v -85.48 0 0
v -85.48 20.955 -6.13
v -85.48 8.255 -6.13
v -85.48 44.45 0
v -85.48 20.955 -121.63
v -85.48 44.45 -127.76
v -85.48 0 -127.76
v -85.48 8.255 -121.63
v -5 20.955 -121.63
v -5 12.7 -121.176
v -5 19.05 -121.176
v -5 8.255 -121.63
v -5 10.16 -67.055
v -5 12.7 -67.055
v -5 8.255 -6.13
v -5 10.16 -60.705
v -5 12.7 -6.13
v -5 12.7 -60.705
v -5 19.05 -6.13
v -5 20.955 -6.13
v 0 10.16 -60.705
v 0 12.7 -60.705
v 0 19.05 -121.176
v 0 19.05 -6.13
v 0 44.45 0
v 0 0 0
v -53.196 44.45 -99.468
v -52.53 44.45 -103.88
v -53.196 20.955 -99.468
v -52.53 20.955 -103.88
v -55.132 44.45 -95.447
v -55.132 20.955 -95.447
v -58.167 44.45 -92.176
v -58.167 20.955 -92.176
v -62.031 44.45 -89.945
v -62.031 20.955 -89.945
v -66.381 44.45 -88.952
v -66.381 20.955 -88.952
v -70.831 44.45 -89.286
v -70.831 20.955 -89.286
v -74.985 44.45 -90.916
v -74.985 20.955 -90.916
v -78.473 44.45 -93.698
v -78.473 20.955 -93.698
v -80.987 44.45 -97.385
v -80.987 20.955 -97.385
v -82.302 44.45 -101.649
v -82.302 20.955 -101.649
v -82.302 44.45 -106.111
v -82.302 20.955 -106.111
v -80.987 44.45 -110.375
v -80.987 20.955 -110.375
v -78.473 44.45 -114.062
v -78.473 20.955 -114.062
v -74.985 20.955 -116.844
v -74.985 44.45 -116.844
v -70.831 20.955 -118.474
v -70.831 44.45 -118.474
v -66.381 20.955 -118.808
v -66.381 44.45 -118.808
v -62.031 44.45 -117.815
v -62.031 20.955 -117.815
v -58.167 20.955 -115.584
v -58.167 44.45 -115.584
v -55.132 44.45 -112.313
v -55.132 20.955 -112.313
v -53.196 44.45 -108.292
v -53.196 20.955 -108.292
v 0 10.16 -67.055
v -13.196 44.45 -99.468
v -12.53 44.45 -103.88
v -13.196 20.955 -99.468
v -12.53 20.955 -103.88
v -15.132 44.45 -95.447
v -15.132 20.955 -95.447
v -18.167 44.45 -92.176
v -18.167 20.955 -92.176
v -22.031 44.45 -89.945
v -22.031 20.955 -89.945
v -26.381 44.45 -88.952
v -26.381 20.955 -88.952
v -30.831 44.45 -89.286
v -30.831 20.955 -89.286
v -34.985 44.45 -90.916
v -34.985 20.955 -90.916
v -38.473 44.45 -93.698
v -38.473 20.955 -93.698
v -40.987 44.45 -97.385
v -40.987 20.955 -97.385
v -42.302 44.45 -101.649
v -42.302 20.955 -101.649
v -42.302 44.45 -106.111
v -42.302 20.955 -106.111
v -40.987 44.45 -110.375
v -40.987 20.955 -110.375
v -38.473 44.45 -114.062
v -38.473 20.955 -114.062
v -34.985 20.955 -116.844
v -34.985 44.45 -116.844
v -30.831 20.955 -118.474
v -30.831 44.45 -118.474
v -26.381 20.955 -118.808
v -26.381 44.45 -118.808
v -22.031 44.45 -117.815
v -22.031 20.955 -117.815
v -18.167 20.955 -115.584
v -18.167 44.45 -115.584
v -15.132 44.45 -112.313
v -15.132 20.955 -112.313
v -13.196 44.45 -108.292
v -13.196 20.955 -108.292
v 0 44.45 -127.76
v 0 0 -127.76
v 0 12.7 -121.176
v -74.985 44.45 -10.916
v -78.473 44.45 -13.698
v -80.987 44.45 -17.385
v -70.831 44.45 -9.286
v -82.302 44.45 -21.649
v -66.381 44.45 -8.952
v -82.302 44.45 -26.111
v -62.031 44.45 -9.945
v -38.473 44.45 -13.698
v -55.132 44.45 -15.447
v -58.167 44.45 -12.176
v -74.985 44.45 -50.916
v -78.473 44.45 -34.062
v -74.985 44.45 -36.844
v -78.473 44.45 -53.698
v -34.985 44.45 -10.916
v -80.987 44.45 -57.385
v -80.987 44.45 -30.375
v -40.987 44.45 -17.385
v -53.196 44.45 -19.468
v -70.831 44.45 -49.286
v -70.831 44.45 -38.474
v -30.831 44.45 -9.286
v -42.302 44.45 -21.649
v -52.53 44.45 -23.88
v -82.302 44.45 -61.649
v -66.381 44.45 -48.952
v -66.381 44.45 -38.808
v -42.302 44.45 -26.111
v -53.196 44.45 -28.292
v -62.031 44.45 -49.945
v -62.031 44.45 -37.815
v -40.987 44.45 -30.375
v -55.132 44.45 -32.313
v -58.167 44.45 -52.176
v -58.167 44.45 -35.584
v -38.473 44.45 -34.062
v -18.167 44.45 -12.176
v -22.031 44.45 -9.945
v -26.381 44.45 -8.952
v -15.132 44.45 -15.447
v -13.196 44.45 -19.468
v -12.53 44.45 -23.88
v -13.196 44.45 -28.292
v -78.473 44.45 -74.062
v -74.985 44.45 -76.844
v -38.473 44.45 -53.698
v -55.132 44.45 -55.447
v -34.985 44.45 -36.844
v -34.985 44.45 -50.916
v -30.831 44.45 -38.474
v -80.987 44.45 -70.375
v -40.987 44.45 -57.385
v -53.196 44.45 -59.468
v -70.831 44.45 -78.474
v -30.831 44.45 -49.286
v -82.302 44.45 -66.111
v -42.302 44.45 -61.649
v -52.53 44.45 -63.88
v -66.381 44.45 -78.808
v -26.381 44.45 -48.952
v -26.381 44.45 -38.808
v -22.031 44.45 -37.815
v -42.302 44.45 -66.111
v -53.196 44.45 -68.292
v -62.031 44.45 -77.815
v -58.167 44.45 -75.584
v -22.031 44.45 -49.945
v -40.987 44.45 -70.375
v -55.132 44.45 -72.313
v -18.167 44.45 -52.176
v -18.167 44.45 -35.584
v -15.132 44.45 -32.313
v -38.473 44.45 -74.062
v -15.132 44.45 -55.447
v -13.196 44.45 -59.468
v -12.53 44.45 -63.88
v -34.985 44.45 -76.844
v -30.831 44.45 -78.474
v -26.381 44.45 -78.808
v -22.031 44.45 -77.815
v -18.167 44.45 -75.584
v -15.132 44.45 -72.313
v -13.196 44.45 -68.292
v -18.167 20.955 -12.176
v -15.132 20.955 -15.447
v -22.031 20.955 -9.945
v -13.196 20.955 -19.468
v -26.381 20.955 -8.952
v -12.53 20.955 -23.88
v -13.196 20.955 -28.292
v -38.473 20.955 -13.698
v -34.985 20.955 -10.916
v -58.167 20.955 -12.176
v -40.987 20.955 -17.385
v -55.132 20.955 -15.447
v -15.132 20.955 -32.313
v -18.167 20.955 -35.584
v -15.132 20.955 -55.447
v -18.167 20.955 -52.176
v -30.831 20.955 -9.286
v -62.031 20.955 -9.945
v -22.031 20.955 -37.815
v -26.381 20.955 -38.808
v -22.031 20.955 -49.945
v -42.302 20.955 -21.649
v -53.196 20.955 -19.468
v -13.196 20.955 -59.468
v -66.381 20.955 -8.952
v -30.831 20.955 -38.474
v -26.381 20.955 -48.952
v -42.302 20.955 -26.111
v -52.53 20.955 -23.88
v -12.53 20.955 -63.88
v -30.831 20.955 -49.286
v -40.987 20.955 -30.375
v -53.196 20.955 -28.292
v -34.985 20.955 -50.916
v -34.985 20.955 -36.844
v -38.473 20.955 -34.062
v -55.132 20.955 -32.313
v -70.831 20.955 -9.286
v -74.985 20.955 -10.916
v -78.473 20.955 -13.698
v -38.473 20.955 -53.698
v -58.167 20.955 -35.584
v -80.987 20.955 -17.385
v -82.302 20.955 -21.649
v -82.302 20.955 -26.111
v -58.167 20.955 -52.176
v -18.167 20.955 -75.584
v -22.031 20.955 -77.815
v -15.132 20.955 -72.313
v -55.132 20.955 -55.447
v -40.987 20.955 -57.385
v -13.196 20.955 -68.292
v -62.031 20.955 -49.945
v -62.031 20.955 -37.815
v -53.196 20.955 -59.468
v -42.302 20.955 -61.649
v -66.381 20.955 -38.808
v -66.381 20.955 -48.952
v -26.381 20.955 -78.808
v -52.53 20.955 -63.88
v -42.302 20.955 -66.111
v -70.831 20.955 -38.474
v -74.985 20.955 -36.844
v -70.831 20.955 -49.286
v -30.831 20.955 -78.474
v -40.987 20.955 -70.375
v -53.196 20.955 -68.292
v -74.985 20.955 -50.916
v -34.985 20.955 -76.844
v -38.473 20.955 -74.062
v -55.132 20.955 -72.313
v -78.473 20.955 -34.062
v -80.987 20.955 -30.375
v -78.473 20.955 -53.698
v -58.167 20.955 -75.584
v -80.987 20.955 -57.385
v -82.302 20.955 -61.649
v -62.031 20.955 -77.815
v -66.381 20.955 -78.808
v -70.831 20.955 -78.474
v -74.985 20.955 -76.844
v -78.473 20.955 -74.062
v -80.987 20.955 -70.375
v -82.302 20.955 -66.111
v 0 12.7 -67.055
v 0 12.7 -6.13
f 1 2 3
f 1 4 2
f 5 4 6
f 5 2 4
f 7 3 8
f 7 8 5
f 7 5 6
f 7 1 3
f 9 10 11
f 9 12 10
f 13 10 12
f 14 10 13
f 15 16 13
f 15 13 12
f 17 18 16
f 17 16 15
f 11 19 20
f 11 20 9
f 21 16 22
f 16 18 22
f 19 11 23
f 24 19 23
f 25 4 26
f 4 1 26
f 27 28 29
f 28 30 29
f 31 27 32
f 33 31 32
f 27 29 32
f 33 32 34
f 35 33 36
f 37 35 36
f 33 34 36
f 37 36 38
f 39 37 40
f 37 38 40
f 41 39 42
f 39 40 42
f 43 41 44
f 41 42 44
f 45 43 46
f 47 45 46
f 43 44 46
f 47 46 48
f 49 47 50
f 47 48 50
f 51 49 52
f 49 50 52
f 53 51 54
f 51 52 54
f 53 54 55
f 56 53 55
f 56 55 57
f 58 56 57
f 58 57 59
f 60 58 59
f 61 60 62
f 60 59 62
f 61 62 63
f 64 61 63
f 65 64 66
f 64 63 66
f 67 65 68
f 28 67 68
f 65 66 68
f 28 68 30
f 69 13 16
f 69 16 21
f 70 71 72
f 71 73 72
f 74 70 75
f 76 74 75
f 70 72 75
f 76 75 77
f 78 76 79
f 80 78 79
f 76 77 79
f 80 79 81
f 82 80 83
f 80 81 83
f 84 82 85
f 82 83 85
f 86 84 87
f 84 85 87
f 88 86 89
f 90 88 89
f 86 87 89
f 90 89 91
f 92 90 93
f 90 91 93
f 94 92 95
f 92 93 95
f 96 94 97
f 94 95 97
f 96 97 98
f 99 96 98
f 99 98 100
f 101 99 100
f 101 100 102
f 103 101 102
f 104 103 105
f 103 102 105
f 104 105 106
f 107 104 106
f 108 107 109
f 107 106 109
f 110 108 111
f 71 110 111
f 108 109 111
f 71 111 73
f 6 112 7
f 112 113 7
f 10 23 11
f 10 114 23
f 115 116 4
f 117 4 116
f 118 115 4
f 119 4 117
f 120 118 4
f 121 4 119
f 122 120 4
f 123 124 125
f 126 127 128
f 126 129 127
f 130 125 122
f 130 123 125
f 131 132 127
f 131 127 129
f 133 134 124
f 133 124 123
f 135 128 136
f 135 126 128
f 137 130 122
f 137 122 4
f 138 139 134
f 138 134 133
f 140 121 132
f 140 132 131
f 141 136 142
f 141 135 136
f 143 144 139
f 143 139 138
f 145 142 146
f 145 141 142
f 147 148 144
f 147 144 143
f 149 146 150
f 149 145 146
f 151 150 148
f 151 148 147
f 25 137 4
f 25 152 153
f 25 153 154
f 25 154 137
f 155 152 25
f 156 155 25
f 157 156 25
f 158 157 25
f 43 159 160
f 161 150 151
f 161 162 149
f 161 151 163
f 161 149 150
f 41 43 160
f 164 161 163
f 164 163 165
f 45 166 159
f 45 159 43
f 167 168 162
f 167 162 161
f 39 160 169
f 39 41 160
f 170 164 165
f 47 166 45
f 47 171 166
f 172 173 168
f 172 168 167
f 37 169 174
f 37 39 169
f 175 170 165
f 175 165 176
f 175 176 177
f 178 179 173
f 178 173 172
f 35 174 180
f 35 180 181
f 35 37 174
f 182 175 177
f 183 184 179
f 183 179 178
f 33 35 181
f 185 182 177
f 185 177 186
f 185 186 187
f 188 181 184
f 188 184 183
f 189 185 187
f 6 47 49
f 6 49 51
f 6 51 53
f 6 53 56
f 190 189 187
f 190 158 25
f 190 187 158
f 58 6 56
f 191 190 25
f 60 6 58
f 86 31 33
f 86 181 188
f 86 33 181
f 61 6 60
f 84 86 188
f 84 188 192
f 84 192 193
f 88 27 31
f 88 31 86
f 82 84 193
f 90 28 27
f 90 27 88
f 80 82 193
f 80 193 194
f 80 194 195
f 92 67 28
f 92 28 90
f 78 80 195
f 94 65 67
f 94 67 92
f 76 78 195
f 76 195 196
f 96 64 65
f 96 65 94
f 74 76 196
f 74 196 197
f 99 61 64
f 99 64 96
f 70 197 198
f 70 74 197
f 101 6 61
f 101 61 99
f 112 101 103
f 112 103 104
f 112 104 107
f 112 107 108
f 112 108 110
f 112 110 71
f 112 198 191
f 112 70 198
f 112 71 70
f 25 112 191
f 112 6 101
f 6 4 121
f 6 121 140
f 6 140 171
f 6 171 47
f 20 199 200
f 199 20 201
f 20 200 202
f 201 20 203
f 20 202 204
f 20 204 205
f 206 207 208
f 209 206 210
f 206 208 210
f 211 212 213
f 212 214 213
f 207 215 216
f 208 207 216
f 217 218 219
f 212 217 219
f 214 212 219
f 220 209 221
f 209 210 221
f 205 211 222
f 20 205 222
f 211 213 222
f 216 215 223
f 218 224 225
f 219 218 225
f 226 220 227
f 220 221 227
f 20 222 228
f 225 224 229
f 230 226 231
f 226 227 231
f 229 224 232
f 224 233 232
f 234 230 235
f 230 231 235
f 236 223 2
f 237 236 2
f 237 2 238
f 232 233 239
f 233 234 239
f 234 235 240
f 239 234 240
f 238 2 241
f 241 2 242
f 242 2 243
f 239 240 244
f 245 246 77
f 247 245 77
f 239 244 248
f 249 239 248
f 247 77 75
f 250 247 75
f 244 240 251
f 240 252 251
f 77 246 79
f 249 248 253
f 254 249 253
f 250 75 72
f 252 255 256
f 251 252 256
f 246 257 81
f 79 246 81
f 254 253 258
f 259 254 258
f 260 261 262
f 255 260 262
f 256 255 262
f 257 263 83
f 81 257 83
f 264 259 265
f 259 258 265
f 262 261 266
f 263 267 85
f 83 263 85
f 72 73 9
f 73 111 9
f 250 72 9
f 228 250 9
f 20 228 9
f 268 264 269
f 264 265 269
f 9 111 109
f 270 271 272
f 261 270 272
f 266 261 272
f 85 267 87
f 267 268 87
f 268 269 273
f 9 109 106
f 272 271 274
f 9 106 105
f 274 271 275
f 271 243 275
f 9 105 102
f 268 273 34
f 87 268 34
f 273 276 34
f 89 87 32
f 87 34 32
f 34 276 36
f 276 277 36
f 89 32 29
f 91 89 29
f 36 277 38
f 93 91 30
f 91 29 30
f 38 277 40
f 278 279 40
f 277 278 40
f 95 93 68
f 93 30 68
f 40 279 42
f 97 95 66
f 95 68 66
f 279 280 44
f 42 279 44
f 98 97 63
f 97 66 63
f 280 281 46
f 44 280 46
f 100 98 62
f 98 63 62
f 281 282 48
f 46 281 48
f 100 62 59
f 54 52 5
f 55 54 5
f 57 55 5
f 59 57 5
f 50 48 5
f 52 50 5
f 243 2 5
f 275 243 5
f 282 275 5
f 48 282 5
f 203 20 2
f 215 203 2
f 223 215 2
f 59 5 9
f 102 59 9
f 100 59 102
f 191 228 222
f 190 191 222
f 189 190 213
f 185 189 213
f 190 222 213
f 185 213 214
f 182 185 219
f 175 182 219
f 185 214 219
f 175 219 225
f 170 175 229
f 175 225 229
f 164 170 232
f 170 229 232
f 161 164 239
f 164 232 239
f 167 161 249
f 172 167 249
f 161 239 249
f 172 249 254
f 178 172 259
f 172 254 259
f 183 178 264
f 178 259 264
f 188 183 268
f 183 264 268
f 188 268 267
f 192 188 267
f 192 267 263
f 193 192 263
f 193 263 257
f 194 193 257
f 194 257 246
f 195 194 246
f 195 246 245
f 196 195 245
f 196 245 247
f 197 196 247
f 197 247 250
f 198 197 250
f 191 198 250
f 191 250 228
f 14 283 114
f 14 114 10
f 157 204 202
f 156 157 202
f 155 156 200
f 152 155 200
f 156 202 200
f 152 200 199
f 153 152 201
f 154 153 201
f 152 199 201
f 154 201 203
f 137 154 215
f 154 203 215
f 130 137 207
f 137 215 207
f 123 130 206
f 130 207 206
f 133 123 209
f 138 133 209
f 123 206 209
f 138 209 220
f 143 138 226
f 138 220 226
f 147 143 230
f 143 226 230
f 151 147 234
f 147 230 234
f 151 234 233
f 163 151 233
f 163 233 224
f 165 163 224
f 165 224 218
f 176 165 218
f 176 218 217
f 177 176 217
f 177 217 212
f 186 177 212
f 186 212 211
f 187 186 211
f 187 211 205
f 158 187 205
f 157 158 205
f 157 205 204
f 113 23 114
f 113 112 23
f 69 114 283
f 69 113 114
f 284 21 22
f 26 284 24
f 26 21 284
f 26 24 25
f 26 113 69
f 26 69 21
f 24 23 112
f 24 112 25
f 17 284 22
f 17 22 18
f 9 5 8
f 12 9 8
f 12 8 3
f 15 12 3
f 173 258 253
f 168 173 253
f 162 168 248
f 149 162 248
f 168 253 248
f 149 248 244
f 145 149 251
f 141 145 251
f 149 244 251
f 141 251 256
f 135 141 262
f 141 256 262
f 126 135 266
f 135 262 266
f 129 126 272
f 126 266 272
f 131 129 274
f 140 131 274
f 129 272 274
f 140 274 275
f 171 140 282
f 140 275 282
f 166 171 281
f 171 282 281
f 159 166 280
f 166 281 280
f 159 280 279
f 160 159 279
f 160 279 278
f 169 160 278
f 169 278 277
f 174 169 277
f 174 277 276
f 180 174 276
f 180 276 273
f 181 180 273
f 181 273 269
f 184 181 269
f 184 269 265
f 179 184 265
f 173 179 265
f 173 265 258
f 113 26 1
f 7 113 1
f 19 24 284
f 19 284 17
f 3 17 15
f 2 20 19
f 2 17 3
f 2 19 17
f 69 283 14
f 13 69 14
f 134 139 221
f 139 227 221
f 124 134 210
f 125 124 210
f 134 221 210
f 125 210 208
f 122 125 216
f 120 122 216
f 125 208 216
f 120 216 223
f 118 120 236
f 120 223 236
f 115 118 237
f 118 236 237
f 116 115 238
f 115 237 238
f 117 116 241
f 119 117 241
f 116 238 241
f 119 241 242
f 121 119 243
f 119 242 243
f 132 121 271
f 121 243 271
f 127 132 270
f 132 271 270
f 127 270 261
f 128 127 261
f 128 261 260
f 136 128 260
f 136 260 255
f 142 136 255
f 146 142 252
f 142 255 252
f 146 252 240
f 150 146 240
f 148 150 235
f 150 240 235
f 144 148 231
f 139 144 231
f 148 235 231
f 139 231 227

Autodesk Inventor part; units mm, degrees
ref_plane "YZ Plane" through (0, 0, 0) normal (1, 0, 0) x (0, 1, 0)
ref_plane "XZ Plane" through (0, 0, 0) normal (0, 1, 0) x (-1, 0, 0)
ref_plane "XY Plane" through (0, 0, 0) normal (0, 0, 1) x (1, 0, 0)
sketch "Sketch1" plane through (0, 0, 0) normal (0, 1, 0) x (-1, 0, 0)
  line L0 (0, 0) -> (85.48, 0)
  line L1 (85.48, 0) -> (85.48, -127.76)
  line L2 (85.48, -127.76) -> (0, -127.76)
  line L3 (0, -127.76) -> (0, 0)
  line L4 (0, 0) -> (7.0711, -7.0711)
  line L5 (0, 0) -> (10, 0) construction
  circle A0 centre (7.0711, -7.0711) radius 4.7625
  dimension "d0" = 85.48
  dimension "d1" = 127.76
  dimension "offsetDiag" = 10
  dimension "d3" = 45
  dimension "d4" = 9.525
extrude "Extrusion1" add sketch "Sketch1" along normal blind 12.7 contours L0 L1 L2 L3 | A0
sketch "Sketch3" plane through (0, 12.7, 0) normal (0, 1, 0) x (1, 0, 0)
  line L0 (0, 0) -> (0, 127.76) projected
  line L1 (0, 63.88) -> (-72.5, 63.88)
  line L2 (-140, 121.63) -> (-5, 121.63)
  line L3 (-5, 121.63) -> (-5, 6.13)
  line L4 (-5, 6.13) -> (-140, 6.13)
  line L5 (-140, 6.13) -> (-140, 121.63)
  line L6 (-140, 121.63) -> (-5, 6.13) construction
  line L7 (-5, 121.63) -> (-140, 6.13) construction
  dimension "d23" = 72.5
  dimension "d24" = 135
  dimension "d25" = 115.5
extrude "Extrusion2" cut sketch "Sketch3" against normal blind 2.54
sketch "Sketch4" plane through (0, 12.7, 0) normal (0, 1, 0) x (1, 0, 0)
  line L0 (-5, 121.63) -> (-5, 6.13) projected
  line L1 (5, 67.055) -> (-5, 67.055)
  line L2 (-5, 67.055) -> (-5, 60.705)
  line L3 (-5, 60.705) -> (5, 60.705)
  line L4 (5, 60.705) -> (5, 67.055)
  line L5 (0, 0) -> (0, 127.76) projected
  line L6 (5, 67.055) -> (-5, 60.705) construction
  line L7 (-5, 67.055) -> (5, 60.705) construction
  point P0 (0, 63.88)
  point P1 (0, 60.705)
  point P2 (0, 67.055)
  dimension "d28" = 6.35
extrude "Extrusion3" cut sketch "Sketch4" against normal blind 2.54 contours L1 L5 L3 L0
sketch "Sketch5" plane through (0, 12.7, 0) normal (0, 1, 0) x (1, 0, 0)
  line L0 (0, 67.055) -> (0, 60.705) projected
  line L1 (0, 63.88) -> (-67.5, 63.88)
  circle A0 centre (-67.5, 63.88) radius 13.335
  line L2 (-85.48, 0) -> (0, 0) projected
  line L3 (-70.04, 127.76) -> (-38.29, 127.76)
  line L4 (-38.29, 127.76) -> (-38.29, 0)
  line L5 (-38.29, 0) -> (-70.04, 0)
  line L6 (-70.04, 0) -> (-70.04, 127.76)
  line L7 (-70.04, 127.76) -> (-38.29, 0) construction
  line L8 (-38.29, 127.76) -> (-70.04, 0) construction
  line L9 (-85.48, 121.63) -> (-5, 121.63) projected
  line L10 (-68.5166, 121.63) -> (-38.29, 121.63)
  line L11 (-38.29, 121.63) -> (-38.29, 127.76)
  line L12 (-38.29, 127.76) -> (-68.5166, 127.76)
  line L13 (-68.5166, 127.76) -> (-68.5166, 121.63)
  line L14 (-5, 6.13) -> (-85.48, 6.13) projected
  line L15 (-70.04, 0) -> (-38.29, 0)
  line L16 (-38.29, 0) -> (-38.29, 6.13)
  line L17 (-38.29, 6.13) -> (-70.04, 6.13)
  line L18 (-70.04, 6.13) -> (-70.04, 0)
  circle A1 centre (-67.5, 63.88) radius 14.9695
  point P0 (-54.165, 63.88)
  point P1 (-70.04, 6.13)
  point P2 (-38.29, 121.63)
  dimension "d32" = 26.67
  dimension "d31" = 67.5
  dimension "d33" = 31.75
  dimension "d158" = 29.939
sketch "Sketch22" plane through (0, 12.7, 0) normal (0, 1, 0) x (1, 0, 0)
  line L0 (0, 127.76) -> (-85.48, 127.76) projected
  line L1 (0, 0) -> (0, 127.76) projected
  line L2 (-85.48, 127.76) -> (0, 127.76)
  line L3 (0, 127.76) -> (0, 121.1763)
  line L4 (0, 121.1763) -> (-85.48, 121.1763)
  line L5 (-85.48, 121.1763) -> (-85.48, 127.76)
  line L6 (0, 0) -> (0, 60.705) projected
  line L7 (-5, 6.13) -> (-85.48, 6.13) projected
  line L8 (0, 0) -> (-85.48, 0)
  line L9 (-85.48, 0) -> (-85.48, 6.13)
  line L10 (-85.48, 6.13) -> (0, 6.13)
  line L11 (0, 6.13) -> (0, 0)
extrude "Extrusion16" add sketch "Sketch22" along normal blind 6.35
sketch "Sketch23" plane through (0, 19.05, 0) normal (0, 1, 0) x (1, 0, 0)
  line L0 (0, 127.76) -> (-85.48, 127.76) projected
  line L1 (-85.48, 0) -> (0, 0) projected
  line L2 (-85.48, 127.76) -> (0, 127.76)
  line L3 (0, 127.76) -> (0, 0)
  line L4 (0, 0) -> (-85.48, 0)
  line L5 (-85.48, 0) -> (-85.48, 127.76)
extrude "Extrusion17" add sketch "Sketch23" along normal blind 25.4
extrude "Extrusion18" cut sketch "Sketch5" along normal blind 38.1 contours A1 L6 A0 L1 | L1 A0 L6 A1 | A0 L6 | L6 A0 A1 | L6 A0
pattern_linear "Rectangular Pattern2" count 3 spacing 40 along (0, 0, 1) count 2 spacing 40 along (1, 0, 0) of "Extrusion18" first direction both ways yes
sketch "Sketch24" plane through (-85.48, 0, -127.76) normal (-1, 0, 0) x (0, 0, 1)
  line L0 (121.63, 10.16) -> (6.13, 10.16) projected
  line L1 (63.88, 10.16) -> (63.88, 19.05)
  line L2 (78.8495, 19.05) -> (48.9105, 19.05) projected
  line L3 (6.13, 8.255) -> (121.63, 8.255)
  line L4 (121.63, 8.255) -> (121.63, 20.955)
  line L5 (121.63, 20.955) -> (6.13, 20.955)
  line L6 (6.13, 20.955) -> (6.13, 8.255)
  line L7 (6.13, 8.255) -> (121.63, 20.955) construction
  line L8 (121.63, 8.255) -> (6.13, 20.955) construction
  point P0 (127.76, 0)
  point P1 (63.88, 14.605)
  dimension "d167" = 12.7
extrude "Extrusion19" cut sketch "Sketch24" against normal up to surface (80.48 mm away)
properties part number "StirredVialHolder"
